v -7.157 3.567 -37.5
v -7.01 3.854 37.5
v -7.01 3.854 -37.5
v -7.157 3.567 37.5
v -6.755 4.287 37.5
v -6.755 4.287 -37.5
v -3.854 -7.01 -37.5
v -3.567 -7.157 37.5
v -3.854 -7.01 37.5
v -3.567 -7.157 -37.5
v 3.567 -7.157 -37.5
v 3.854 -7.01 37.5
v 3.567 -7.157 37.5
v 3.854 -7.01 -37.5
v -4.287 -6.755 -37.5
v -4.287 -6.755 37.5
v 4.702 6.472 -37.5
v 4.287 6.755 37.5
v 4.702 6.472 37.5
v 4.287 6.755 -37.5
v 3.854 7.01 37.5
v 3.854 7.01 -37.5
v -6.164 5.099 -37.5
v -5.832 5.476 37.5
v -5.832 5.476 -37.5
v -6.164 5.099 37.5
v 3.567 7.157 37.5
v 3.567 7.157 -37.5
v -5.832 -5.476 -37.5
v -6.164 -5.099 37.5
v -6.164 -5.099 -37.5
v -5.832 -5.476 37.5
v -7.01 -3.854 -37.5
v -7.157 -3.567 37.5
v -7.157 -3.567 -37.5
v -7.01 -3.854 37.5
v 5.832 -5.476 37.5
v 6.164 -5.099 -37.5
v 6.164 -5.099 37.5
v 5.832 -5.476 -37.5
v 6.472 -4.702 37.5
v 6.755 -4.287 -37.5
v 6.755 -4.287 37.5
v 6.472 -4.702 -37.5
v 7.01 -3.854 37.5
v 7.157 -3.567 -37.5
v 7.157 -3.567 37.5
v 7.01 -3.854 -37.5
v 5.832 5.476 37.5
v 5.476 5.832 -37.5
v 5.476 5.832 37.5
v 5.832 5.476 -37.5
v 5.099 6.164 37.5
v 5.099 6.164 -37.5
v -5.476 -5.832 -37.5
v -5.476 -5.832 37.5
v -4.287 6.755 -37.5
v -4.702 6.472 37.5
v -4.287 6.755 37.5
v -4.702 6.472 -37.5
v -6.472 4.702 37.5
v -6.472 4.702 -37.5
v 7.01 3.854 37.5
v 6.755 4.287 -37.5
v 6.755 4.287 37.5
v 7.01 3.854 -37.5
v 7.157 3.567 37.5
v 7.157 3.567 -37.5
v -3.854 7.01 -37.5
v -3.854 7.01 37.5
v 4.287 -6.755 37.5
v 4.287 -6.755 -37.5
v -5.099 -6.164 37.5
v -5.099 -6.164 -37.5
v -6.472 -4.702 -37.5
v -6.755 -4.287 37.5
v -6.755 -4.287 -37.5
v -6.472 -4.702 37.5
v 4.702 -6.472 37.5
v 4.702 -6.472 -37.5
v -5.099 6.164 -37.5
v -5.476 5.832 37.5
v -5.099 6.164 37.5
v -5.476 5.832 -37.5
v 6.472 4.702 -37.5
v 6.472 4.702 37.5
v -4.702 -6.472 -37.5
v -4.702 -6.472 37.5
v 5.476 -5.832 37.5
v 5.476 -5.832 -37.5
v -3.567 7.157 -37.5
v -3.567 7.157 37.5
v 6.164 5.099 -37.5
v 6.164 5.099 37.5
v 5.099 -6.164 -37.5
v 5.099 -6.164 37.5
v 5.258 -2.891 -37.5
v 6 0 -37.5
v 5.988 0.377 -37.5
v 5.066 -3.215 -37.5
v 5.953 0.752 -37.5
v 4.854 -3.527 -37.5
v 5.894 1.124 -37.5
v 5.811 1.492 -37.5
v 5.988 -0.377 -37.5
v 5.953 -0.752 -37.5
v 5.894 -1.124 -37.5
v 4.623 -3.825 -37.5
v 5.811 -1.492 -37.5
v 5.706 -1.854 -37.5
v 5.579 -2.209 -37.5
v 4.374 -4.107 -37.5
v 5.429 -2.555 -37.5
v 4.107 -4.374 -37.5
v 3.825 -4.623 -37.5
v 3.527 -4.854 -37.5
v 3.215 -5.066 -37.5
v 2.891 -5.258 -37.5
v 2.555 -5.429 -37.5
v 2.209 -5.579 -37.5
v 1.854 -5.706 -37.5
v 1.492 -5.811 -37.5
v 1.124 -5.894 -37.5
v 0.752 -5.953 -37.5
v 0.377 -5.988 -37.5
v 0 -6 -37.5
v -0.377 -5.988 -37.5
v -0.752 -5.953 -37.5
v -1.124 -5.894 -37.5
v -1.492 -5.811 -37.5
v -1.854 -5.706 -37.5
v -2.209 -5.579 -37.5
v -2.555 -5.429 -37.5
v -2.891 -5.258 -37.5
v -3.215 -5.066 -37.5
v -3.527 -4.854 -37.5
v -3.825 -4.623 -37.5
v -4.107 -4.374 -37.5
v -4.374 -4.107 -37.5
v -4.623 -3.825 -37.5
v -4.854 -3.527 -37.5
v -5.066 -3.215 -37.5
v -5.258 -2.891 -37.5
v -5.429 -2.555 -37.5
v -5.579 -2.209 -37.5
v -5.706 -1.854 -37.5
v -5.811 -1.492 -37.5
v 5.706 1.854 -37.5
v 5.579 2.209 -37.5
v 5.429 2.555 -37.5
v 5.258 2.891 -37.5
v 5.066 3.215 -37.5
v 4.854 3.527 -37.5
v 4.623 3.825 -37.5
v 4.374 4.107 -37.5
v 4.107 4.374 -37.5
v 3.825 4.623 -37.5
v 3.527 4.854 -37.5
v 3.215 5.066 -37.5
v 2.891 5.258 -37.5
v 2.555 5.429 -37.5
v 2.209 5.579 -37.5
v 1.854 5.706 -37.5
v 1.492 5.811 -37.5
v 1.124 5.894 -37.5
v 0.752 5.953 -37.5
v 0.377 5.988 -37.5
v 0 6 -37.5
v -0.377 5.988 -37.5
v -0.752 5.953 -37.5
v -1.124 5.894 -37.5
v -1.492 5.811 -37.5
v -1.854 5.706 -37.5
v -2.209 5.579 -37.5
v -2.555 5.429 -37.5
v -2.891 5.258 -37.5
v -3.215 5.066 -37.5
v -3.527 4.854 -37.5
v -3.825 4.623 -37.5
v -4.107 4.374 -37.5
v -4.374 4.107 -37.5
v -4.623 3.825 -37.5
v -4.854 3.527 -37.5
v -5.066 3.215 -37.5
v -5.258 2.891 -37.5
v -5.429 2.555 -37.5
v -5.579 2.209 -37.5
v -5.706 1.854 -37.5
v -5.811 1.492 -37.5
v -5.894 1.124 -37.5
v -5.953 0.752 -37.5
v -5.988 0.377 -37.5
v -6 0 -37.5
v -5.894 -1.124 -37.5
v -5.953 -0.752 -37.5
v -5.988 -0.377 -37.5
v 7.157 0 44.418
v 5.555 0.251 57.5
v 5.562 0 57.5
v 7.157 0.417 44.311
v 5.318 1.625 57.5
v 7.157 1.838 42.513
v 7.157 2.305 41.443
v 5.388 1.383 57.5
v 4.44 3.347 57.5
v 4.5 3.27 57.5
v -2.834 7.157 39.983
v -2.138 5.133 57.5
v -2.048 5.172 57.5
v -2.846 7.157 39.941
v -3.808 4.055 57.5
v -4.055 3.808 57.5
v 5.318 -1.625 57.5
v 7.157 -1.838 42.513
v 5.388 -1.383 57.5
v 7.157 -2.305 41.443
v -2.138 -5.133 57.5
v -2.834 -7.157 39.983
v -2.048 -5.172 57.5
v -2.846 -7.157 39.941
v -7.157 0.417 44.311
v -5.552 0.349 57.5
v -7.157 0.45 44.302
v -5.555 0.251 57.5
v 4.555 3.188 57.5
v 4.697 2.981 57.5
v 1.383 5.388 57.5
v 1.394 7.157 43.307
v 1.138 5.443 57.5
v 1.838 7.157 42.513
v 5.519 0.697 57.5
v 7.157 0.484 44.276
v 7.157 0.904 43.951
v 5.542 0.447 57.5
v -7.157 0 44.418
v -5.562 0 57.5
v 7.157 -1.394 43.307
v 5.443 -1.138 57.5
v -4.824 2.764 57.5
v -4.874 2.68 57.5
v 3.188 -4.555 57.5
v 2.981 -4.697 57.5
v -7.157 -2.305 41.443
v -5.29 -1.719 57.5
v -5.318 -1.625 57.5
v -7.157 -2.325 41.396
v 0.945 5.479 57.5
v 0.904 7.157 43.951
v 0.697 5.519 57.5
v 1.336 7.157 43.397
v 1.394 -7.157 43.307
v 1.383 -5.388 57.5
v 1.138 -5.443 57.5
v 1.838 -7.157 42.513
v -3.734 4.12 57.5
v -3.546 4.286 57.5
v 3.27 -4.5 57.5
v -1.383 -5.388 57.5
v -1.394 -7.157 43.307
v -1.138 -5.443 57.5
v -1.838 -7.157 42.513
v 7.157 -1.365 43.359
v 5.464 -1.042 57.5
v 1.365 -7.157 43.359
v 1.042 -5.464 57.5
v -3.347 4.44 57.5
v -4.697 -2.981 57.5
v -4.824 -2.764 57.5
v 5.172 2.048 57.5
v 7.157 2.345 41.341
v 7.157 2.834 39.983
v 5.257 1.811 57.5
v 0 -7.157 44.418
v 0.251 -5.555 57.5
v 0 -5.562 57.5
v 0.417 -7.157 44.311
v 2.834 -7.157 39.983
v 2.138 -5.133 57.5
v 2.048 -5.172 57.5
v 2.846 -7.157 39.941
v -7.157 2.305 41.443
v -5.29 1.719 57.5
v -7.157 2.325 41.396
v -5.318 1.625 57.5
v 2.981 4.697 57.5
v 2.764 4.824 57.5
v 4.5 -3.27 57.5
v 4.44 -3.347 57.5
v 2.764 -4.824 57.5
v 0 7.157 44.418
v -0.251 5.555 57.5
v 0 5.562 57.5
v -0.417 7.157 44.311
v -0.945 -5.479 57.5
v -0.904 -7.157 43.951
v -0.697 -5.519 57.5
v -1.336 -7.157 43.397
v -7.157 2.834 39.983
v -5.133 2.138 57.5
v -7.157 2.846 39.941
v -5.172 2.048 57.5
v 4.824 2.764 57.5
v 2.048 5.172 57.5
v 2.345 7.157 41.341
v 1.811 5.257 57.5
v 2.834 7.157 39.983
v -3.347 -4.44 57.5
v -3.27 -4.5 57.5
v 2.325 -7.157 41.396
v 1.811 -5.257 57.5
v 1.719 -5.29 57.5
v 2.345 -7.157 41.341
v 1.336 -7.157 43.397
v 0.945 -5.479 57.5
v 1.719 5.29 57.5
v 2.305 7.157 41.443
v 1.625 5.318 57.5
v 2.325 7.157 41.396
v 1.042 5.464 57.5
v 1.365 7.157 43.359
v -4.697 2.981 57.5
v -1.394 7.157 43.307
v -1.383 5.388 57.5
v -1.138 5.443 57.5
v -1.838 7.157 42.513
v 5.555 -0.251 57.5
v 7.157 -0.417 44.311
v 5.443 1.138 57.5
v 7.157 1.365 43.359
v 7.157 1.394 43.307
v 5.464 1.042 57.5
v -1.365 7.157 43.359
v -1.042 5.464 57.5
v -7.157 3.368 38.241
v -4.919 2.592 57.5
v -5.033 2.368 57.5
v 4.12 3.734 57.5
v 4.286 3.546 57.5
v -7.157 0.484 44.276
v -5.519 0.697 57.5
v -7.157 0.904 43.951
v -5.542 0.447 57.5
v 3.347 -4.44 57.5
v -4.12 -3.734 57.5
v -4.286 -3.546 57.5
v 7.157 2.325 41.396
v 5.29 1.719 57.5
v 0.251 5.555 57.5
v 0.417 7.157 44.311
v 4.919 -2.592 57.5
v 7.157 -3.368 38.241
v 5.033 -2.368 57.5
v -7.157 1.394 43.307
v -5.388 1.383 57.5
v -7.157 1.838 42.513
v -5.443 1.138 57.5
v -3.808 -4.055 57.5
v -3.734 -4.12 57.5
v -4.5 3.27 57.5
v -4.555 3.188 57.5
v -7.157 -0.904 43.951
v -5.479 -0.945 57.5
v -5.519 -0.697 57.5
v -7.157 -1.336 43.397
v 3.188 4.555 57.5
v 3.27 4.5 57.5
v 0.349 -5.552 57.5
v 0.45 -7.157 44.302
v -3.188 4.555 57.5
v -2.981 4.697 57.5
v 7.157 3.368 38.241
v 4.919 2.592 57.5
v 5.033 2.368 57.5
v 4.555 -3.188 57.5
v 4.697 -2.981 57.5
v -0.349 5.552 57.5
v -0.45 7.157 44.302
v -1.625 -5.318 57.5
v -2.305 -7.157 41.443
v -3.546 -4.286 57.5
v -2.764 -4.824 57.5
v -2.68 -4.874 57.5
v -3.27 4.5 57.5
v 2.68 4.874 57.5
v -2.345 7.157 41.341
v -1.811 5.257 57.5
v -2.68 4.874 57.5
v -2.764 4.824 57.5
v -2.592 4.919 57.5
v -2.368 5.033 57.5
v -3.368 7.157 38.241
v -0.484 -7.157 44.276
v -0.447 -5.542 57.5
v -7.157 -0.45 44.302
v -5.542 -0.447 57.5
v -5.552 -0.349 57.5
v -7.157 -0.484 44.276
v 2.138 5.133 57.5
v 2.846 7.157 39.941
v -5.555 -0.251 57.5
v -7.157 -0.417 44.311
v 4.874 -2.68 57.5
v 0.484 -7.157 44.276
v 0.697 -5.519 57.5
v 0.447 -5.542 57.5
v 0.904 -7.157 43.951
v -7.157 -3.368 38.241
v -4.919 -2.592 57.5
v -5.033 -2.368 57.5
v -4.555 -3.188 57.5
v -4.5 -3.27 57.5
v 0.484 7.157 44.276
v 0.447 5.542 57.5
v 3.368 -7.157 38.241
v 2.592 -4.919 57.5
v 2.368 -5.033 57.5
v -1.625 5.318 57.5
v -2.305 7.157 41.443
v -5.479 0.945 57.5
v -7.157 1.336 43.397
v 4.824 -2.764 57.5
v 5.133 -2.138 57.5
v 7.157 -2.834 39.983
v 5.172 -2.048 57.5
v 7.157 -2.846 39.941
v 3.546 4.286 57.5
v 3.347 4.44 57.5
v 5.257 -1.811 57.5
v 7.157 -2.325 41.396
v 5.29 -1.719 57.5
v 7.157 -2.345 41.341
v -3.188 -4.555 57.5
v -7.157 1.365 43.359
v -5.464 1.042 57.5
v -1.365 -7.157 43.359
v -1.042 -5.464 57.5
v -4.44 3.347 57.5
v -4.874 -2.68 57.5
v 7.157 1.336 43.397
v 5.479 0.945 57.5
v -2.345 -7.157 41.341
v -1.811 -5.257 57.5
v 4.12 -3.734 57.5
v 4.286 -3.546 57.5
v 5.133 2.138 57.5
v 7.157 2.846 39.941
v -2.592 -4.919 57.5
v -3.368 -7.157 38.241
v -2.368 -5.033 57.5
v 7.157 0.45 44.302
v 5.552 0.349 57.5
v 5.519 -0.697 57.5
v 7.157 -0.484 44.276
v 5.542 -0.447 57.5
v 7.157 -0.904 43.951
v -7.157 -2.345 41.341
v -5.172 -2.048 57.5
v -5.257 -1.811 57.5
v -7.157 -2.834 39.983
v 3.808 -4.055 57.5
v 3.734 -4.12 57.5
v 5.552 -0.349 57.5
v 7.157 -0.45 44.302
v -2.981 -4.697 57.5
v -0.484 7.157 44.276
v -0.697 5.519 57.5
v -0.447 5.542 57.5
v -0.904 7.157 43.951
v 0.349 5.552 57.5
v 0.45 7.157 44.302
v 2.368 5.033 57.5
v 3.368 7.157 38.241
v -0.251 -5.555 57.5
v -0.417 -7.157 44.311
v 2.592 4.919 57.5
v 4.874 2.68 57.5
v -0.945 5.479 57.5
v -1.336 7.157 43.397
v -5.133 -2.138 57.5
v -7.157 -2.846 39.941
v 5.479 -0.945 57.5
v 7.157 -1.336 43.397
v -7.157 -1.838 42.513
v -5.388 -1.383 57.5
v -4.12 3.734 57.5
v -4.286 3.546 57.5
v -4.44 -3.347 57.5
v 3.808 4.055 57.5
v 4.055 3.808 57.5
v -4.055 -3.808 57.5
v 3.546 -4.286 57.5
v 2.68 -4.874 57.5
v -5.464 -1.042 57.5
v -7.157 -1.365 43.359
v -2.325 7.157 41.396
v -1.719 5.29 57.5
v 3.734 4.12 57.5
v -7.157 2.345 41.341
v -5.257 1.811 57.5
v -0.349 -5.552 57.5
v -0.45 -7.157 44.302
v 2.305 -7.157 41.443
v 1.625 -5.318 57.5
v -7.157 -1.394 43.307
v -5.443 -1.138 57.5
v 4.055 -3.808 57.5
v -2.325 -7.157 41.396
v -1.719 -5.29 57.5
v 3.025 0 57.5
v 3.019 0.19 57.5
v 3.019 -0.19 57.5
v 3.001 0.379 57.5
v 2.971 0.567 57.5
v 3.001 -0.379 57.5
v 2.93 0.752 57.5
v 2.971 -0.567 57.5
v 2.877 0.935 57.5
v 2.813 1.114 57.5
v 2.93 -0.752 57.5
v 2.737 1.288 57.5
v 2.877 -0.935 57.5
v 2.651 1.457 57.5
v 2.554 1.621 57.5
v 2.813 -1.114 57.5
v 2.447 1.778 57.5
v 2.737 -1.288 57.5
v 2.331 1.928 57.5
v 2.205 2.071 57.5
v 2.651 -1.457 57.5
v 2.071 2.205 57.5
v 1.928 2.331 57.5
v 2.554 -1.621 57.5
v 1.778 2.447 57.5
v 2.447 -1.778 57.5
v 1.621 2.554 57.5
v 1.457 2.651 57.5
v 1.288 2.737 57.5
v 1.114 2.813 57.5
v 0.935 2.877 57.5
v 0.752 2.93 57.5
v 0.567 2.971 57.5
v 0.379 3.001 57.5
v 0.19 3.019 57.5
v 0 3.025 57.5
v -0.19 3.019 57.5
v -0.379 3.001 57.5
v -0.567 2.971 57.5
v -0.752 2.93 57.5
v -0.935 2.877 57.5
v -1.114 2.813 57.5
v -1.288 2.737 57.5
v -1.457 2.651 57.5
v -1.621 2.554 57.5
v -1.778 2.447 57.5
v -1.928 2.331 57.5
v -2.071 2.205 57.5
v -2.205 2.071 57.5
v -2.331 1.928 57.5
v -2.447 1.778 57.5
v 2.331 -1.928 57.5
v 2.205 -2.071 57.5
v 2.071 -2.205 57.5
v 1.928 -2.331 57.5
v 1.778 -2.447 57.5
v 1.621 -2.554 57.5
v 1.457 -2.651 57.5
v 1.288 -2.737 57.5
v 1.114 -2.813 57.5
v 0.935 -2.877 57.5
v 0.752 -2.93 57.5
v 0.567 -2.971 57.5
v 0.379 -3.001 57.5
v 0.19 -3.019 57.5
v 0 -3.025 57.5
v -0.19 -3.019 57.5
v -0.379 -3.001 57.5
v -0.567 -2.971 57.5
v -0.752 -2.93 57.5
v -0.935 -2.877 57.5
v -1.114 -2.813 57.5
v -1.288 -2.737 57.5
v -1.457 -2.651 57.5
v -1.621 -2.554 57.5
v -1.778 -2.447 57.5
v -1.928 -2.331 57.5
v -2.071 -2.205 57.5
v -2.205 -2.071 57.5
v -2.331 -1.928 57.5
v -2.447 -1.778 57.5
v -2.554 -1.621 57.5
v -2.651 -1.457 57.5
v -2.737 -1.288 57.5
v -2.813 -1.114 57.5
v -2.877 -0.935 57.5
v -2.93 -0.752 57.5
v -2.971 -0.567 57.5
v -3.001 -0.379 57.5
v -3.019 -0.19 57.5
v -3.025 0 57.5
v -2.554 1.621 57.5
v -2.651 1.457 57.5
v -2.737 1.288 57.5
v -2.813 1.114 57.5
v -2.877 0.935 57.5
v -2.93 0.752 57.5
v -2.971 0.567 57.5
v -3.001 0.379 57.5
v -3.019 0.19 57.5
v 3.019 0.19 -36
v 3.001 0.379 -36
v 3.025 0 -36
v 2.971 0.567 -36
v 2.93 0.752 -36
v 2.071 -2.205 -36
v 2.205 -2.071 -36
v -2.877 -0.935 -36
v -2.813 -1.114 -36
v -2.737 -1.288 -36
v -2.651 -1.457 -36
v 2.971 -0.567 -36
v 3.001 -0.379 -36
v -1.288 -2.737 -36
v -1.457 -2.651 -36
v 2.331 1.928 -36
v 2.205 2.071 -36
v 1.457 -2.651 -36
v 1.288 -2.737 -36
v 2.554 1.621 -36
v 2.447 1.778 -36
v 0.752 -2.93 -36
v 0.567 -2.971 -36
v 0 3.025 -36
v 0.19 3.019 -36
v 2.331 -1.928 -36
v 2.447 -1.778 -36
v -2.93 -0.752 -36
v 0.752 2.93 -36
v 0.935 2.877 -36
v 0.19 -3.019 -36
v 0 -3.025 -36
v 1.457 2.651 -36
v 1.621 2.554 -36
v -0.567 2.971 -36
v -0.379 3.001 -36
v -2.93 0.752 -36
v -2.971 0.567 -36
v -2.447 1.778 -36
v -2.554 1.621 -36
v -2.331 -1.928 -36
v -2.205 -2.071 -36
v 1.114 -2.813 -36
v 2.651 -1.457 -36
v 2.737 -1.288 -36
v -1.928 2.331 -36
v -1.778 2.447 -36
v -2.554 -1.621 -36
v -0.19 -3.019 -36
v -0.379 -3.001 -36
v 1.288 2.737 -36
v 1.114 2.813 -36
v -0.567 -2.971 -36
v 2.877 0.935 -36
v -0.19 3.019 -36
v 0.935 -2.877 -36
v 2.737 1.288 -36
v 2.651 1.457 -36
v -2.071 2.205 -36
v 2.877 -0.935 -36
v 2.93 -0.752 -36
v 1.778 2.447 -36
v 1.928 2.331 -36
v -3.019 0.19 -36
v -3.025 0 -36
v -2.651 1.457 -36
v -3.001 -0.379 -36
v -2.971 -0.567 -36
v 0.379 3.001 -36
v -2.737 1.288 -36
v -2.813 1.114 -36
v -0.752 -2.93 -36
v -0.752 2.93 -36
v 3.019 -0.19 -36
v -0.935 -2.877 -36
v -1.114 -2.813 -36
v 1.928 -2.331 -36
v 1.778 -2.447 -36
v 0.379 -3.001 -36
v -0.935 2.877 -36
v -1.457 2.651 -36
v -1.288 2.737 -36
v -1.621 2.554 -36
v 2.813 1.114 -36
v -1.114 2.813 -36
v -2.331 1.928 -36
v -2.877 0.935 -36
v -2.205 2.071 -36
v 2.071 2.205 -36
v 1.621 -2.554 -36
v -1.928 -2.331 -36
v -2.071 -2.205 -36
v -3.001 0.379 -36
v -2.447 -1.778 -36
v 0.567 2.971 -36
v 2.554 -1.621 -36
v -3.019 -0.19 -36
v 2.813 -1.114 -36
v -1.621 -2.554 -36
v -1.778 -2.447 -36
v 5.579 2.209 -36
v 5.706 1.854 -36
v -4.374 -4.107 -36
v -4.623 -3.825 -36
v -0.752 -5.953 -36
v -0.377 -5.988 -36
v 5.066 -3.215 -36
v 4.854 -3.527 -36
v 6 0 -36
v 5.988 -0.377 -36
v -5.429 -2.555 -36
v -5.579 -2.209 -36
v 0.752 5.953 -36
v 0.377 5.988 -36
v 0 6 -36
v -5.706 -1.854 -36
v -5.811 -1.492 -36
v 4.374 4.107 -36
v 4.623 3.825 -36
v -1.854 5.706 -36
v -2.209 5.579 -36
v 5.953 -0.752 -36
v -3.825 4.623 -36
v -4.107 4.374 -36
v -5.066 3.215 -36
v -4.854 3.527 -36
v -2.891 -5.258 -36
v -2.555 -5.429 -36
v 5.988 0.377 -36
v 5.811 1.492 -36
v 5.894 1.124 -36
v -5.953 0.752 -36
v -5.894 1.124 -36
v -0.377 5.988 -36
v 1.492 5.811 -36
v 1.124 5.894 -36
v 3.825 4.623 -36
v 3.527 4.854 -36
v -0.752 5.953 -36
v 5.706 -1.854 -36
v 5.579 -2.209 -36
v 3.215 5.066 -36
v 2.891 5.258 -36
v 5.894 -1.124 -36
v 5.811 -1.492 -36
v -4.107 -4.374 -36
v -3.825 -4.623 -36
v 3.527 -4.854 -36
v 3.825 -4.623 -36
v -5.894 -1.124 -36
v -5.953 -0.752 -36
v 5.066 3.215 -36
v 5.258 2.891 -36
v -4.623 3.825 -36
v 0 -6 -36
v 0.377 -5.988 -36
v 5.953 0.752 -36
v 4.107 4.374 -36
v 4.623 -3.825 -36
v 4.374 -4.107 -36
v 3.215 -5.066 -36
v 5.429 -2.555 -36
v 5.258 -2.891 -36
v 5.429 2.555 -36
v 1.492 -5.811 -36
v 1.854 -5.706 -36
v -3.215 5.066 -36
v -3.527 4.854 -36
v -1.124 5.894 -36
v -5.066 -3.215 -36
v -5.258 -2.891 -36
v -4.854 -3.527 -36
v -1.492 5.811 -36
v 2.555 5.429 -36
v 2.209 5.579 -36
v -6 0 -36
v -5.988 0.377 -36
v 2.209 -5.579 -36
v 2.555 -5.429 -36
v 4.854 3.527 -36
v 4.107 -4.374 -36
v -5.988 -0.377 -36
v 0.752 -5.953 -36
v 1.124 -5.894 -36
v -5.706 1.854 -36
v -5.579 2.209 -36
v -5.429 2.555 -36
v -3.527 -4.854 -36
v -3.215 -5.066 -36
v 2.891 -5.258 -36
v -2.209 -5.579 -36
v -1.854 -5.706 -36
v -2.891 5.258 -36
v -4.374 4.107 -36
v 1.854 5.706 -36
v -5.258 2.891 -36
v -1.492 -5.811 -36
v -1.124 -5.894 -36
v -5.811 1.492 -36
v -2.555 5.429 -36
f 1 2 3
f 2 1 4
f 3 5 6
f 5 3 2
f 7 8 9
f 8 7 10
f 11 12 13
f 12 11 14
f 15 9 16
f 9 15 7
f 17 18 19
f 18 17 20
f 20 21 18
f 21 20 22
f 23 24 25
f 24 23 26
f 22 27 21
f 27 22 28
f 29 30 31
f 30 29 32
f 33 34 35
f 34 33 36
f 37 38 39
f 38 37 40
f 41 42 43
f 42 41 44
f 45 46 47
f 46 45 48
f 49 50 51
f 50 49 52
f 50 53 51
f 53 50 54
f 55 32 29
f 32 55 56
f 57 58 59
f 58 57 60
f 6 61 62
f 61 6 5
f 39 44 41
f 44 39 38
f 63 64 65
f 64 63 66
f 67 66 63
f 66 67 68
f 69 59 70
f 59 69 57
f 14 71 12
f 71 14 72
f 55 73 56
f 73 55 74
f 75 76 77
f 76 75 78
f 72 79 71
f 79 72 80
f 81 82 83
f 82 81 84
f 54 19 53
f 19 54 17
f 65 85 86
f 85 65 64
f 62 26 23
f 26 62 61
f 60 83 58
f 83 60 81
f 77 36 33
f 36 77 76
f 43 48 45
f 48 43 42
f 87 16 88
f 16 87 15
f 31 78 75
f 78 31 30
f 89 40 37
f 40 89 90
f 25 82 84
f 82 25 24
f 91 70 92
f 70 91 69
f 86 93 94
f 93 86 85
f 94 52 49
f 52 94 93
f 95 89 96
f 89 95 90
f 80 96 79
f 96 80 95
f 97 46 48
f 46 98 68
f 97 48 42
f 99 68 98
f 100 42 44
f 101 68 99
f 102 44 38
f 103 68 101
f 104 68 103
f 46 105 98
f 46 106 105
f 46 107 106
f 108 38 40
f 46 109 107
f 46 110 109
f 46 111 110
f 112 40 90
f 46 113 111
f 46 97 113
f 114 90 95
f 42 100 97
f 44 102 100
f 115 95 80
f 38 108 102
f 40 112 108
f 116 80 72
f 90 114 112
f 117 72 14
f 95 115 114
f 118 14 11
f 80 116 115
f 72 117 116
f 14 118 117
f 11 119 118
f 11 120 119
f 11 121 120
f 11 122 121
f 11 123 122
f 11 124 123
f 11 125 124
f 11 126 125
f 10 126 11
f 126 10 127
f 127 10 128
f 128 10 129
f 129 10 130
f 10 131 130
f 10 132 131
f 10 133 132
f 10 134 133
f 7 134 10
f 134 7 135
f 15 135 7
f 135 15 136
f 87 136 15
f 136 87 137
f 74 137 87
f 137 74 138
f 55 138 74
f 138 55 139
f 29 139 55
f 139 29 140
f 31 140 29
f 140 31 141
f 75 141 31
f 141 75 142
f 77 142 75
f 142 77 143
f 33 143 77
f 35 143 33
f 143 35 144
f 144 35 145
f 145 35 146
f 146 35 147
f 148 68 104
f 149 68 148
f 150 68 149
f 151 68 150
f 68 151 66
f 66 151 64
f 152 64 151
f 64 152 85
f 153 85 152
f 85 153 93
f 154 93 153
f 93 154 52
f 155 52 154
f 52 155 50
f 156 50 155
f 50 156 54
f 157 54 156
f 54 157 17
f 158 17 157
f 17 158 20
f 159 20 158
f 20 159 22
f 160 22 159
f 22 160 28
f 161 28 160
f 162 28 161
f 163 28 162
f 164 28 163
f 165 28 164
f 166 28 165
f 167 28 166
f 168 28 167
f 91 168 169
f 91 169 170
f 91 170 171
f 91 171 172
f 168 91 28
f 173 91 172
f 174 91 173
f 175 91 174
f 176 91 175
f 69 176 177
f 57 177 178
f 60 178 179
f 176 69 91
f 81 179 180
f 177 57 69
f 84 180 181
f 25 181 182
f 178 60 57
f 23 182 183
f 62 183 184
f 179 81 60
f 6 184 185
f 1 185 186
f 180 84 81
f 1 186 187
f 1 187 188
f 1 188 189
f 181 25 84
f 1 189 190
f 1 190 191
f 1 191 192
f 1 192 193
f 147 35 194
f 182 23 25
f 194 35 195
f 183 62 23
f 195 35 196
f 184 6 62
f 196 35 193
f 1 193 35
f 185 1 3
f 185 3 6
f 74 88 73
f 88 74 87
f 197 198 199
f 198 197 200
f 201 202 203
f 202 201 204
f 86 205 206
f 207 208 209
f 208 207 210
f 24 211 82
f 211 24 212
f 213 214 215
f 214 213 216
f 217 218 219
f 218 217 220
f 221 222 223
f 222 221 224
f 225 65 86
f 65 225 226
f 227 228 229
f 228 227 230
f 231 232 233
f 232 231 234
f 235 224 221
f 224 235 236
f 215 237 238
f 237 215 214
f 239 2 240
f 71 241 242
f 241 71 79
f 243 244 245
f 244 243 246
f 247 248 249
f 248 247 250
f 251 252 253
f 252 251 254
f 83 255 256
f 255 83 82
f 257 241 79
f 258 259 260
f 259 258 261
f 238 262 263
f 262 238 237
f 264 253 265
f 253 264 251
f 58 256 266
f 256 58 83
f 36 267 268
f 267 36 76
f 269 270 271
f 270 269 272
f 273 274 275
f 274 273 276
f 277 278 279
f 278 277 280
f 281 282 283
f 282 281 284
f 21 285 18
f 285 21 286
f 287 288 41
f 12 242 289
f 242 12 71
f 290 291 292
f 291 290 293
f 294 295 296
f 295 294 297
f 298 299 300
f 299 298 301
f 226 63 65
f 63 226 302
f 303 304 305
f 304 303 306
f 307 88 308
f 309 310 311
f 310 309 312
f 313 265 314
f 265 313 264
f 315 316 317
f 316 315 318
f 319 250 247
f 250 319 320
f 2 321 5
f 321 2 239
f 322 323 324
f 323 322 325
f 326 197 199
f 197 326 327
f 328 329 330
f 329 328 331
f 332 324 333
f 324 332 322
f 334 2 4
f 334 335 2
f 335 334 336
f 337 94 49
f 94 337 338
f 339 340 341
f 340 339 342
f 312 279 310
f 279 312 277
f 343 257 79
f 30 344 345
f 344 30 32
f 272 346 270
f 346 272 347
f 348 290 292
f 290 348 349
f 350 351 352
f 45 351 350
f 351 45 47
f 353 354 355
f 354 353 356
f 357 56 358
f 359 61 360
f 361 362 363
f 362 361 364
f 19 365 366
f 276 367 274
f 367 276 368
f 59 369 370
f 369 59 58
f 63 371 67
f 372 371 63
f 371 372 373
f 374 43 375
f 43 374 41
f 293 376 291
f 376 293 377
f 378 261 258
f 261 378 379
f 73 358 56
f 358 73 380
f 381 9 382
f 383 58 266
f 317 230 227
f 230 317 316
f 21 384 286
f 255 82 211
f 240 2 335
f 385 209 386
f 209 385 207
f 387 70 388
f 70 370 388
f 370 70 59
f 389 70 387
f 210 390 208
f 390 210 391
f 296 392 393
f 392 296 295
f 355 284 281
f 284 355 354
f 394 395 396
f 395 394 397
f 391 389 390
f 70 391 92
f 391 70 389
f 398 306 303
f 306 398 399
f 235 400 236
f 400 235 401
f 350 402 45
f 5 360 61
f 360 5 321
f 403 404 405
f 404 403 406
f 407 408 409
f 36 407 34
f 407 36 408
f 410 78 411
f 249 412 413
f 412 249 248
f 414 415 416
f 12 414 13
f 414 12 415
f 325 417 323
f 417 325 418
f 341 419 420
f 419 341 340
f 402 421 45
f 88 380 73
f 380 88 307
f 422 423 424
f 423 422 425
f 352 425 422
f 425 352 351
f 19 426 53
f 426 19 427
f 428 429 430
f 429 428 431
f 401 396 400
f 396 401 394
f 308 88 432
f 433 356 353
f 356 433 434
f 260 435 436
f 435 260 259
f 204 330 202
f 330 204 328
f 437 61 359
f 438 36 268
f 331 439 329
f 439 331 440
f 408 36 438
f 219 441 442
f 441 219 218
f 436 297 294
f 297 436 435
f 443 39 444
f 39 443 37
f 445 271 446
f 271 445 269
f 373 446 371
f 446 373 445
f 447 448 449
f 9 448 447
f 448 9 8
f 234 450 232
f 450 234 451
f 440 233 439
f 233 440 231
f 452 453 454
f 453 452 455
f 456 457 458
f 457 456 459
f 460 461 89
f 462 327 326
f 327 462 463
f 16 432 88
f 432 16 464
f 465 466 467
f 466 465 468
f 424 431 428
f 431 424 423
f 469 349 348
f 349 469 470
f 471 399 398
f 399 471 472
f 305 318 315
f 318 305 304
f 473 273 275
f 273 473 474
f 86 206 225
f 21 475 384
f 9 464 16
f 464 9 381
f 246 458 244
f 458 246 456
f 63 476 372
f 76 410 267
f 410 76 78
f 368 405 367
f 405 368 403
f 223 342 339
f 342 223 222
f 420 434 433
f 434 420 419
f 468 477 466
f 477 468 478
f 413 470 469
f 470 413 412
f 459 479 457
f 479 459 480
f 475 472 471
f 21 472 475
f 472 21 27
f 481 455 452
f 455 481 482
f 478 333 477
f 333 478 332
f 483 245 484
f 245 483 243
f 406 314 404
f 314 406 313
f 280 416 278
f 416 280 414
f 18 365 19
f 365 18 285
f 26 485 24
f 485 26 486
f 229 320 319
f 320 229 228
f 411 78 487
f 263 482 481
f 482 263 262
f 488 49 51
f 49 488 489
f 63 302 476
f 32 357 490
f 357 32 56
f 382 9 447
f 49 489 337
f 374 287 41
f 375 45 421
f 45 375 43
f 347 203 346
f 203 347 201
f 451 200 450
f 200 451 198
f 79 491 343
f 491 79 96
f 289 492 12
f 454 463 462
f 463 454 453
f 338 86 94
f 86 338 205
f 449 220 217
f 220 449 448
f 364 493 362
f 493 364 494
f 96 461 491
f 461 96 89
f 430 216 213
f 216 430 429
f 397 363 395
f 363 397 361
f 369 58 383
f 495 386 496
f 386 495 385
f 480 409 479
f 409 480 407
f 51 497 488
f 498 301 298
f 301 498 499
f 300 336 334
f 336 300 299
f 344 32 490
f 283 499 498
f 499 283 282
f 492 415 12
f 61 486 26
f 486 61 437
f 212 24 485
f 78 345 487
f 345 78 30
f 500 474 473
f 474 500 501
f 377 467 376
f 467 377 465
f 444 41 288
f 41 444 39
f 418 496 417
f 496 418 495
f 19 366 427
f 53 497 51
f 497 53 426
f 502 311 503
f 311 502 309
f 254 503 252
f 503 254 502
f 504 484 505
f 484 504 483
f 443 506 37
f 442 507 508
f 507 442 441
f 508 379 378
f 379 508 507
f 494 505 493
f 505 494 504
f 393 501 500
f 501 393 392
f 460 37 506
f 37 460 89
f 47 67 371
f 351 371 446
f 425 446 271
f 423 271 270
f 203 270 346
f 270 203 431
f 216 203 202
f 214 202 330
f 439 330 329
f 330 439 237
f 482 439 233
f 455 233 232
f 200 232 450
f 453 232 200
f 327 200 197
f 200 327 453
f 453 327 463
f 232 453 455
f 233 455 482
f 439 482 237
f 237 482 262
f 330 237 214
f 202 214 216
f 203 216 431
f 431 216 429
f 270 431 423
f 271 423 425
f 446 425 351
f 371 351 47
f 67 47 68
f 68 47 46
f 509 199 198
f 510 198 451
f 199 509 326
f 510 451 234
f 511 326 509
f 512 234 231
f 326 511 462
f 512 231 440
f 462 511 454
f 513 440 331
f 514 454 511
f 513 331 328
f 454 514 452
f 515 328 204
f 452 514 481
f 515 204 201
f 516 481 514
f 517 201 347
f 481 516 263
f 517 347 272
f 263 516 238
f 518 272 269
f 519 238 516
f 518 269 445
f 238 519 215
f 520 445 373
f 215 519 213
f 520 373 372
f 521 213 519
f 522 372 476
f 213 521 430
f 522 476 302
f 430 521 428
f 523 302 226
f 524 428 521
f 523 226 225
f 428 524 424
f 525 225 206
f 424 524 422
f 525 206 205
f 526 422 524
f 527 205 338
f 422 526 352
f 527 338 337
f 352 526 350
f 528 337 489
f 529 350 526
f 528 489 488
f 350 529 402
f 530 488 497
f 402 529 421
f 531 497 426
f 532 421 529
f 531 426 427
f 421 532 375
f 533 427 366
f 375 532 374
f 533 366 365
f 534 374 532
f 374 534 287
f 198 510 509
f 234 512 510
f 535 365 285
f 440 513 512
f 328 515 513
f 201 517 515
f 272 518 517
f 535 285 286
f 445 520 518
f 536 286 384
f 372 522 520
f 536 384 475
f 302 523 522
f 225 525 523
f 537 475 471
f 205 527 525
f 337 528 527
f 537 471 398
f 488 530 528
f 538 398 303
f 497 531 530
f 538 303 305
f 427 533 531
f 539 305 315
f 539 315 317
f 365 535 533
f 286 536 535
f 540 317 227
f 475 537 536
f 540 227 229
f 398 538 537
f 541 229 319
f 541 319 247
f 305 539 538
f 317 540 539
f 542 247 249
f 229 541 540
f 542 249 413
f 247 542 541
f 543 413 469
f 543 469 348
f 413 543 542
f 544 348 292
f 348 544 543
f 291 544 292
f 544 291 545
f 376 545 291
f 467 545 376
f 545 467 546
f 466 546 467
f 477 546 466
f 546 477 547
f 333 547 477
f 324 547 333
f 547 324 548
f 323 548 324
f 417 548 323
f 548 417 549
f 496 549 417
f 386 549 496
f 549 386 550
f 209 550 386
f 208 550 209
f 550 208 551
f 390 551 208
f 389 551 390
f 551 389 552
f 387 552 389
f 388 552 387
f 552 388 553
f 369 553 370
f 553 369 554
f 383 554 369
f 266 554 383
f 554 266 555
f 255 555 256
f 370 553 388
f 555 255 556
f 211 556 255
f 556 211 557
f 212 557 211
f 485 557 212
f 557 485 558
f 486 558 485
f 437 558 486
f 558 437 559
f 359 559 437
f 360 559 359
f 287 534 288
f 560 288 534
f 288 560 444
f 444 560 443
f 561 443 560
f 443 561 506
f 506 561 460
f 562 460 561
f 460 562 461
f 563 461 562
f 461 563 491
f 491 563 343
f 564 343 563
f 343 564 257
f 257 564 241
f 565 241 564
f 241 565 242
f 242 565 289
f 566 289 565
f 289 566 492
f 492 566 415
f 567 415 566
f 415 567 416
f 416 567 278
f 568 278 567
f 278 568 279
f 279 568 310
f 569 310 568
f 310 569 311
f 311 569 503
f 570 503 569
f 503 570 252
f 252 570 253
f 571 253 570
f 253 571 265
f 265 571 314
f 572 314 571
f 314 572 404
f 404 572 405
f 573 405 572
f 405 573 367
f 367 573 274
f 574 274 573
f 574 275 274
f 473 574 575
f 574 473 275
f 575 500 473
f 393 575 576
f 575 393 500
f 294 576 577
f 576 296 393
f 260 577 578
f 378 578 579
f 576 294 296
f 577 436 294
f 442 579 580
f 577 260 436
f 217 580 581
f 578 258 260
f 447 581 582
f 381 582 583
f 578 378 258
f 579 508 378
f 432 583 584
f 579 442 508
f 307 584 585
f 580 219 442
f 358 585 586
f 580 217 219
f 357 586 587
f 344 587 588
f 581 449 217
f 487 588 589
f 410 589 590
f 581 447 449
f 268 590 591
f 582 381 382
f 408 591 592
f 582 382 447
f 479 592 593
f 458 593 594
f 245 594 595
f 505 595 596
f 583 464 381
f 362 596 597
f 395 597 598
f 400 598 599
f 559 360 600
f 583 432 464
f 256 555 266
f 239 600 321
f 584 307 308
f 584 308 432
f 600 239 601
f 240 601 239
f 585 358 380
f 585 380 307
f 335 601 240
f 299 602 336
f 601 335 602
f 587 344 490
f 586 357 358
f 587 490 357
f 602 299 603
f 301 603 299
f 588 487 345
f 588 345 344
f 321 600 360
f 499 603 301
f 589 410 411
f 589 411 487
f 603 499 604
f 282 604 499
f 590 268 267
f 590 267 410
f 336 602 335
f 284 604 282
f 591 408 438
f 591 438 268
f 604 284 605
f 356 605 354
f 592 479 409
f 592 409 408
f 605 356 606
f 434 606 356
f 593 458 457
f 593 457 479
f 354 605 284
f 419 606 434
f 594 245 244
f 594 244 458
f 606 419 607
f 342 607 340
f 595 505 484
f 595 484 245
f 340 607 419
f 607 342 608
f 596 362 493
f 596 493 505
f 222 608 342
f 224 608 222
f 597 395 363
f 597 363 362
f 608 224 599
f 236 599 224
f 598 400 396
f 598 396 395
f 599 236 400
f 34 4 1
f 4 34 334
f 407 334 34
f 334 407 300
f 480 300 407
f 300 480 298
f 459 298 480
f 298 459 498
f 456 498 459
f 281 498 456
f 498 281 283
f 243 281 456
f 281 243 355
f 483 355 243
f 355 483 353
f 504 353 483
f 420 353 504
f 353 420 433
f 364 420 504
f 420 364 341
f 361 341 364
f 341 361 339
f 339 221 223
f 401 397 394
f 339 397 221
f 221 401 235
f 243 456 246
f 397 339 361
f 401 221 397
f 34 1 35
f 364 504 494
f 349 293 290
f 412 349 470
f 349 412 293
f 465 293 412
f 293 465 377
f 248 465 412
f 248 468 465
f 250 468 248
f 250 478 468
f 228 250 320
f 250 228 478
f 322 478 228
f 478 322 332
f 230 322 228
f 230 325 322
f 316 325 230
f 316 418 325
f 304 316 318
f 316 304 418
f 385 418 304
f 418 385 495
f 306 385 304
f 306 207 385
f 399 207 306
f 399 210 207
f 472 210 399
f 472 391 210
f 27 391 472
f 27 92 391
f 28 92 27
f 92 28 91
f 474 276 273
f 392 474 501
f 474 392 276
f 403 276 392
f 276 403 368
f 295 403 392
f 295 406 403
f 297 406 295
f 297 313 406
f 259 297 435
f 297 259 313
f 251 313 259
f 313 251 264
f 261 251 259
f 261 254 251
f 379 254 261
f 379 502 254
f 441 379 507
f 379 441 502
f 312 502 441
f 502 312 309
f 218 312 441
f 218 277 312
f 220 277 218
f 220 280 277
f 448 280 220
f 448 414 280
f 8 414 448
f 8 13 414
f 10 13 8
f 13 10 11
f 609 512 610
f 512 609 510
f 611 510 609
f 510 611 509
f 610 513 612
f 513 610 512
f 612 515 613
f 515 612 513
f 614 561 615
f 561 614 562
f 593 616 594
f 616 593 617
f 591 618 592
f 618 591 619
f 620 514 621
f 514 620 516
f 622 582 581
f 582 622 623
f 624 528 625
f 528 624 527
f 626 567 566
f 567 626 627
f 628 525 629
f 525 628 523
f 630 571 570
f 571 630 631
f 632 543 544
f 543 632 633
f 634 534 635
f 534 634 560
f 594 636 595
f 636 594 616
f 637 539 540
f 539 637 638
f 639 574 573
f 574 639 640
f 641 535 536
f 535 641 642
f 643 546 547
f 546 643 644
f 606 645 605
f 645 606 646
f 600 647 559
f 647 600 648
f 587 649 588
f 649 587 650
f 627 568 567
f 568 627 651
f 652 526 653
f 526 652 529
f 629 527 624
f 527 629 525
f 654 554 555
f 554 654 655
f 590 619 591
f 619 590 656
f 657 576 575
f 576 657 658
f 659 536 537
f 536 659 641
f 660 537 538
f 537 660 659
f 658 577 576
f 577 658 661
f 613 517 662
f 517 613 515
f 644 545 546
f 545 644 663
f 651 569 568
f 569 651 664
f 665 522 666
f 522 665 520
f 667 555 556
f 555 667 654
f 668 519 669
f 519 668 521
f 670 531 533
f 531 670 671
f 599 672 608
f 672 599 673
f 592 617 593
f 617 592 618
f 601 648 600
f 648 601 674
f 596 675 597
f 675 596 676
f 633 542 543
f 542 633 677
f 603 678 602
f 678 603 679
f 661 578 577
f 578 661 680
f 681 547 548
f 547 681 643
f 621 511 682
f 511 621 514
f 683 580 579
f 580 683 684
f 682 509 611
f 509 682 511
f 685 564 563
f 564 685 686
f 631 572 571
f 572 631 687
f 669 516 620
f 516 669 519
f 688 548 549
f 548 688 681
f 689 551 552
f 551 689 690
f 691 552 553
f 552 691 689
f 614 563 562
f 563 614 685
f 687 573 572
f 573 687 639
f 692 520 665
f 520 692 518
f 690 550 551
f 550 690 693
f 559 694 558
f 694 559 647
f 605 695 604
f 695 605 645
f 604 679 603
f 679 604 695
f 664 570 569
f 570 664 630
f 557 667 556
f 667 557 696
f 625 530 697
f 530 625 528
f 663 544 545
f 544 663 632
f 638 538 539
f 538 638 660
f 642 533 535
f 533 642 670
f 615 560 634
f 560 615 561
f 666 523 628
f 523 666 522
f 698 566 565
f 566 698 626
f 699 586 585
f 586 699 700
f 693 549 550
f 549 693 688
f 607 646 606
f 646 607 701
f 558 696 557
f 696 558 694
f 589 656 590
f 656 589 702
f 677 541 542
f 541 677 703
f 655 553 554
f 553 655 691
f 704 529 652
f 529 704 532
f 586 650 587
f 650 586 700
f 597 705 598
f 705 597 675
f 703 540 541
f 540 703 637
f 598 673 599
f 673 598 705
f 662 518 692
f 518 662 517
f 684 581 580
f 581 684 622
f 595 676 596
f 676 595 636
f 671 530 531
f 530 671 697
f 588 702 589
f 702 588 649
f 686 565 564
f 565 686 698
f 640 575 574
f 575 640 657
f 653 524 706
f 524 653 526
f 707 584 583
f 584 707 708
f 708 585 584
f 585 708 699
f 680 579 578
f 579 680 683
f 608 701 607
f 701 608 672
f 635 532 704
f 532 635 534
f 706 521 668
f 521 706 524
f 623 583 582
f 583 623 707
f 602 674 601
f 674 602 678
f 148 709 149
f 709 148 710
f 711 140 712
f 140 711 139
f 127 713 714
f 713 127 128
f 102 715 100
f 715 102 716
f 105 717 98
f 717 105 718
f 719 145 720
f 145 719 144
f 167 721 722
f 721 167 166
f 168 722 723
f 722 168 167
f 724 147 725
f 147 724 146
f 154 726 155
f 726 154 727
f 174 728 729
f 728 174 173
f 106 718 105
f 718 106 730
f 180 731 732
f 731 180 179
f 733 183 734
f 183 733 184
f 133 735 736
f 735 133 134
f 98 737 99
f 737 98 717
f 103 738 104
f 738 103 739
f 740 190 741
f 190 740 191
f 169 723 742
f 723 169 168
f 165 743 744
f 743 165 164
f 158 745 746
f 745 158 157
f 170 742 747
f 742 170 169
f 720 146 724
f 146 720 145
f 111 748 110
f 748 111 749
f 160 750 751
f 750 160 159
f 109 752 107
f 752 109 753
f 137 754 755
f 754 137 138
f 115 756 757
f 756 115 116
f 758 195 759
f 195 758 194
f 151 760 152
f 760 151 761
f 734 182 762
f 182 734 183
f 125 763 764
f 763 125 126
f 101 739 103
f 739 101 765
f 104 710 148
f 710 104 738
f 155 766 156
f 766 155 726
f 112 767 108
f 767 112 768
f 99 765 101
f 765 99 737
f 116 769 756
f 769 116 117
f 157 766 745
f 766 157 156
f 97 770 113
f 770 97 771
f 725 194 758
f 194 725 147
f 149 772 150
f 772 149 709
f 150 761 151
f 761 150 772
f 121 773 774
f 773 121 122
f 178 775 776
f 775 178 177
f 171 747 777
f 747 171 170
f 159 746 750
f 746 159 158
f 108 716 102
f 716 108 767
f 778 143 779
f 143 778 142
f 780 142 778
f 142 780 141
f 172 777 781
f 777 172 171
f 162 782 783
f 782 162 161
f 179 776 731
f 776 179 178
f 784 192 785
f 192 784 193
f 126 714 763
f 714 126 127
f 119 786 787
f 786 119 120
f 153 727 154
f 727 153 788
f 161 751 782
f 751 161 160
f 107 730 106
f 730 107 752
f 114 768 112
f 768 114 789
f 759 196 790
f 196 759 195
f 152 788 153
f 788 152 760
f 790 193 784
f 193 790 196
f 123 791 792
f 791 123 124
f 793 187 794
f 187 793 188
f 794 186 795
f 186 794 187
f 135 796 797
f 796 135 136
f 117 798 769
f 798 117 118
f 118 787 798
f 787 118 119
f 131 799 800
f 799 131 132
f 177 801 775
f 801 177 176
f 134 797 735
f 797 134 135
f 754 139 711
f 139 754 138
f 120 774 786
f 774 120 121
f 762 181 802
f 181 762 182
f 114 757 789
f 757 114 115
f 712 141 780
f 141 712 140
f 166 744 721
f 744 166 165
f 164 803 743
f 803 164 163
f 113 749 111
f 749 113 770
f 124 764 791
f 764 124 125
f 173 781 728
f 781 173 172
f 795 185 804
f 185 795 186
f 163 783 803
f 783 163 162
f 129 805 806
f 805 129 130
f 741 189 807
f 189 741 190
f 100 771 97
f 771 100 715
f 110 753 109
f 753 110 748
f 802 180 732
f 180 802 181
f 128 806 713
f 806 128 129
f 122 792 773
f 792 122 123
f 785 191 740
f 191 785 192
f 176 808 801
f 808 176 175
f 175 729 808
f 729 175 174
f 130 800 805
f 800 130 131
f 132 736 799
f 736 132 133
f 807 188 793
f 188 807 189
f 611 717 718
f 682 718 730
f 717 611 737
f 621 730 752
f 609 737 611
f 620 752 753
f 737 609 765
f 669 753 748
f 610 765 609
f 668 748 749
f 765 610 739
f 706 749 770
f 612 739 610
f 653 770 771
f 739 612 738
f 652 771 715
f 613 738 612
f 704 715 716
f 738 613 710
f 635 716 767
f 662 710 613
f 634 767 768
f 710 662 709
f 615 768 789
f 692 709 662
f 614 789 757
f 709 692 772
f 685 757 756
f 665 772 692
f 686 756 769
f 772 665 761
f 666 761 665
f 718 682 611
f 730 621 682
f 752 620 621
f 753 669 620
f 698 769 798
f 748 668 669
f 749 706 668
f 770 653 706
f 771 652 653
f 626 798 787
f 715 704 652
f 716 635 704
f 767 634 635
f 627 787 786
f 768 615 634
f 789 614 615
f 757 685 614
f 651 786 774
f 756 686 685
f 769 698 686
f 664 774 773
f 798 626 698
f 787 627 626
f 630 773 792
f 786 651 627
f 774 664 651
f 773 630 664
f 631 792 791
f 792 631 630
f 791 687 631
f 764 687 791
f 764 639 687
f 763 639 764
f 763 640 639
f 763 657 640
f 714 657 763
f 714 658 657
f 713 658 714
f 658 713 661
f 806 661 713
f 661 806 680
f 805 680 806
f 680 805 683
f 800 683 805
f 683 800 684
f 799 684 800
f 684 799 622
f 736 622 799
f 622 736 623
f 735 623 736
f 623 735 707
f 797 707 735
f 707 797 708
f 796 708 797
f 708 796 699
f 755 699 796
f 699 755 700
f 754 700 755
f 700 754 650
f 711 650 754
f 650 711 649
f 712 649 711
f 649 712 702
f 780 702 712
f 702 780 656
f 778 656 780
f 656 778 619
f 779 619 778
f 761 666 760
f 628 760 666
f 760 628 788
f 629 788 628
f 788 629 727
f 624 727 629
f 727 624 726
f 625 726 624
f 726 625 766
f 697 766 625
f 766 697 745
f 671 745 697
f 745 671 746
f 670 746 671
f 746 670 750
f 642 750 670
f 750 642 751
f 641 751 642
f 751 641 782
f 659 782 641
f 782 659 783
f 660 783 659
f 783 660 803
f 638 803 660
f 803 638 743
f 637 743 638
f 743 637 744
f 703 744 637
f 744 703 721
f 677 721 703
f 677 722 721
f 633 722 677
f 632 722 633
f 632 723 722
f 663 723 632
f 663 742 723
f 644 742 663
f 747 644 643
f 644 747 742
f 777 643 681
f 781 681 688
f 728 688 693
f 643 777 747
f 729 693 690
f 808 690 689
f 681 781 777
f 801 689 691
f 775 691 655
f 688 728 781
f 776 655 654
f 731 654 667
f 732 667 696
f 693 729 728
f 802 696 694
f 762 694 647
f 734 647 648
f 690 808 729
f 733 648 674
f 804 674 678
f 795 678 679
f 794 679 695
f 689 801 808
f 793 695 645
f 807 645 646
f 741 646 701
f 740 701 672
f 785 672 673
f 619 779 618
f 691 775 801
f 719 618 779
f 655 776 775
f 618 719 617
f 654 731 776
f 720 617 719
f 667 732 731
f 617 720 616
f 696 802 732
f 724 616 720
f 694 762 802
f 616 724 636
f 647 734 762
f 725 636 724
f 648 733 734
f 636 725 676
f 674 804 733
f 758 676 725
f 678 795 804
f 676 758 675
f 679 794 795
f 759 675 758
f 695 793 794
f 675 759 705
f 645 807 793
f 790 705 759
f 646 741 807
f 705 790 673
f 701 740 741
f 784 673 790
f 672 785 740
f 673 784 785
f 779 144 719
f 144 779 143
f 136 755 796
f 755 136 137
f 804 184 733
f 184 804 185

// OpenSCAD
// This 12 gauge primer punch. Insert a 40d nail and round off its end.
//
// Warning -- some sanding and fitting may be required.
//
// This is licensed under the creative commons+attribution license
//
// To fulfil the attribution requirement, please link to:
// http://www.thingiverse.com/thing:2208570

/* [Main] */

// Define number of facets (large numbers provide better smoothing)
$fn=100;

// Define height of upper body in mm
body_height=75.0;

// Define height of lower cone in mm
cone_height=40.0;

// Define outside diameter of upper body in mm
body_diameter=16.0;

// Define outside diameter of lower cone end in mm
end_diameter=6.25;

// Define inside diameter of hole in mm
inside_diameter=6.05;

// Countersink depth in mm
depth=1.5;

// Counsersink diameter in mm
head_diameter=12.0;

difference()
{
	intersection()
	{
		#translate([0,0,0]) cube([body_diameter/sqrt(2)+3,body_diameter/sqrt(2)+3,body_height+cone_height],center=true);
		union() // Draw outer shape
		{
			translate([0,0,0])                           cylinder(h=body_height,r=body_diameter/2,center=true);
			translate([0,0,(body_height+cone_height)/2]) cylinder(h=cone_height,r1=body_diameter/2,r2=end_diameter/2,center=true);
		}
	}
	// Drill hole
	translate([0,0,cone_height/2])  cylinder(h=body_height+cone_height+2,r=inside_diameter/2,center=true);
	// Counter sink part of nail head
	translate([0,0,-(body_height-depth)/2]) cylinder(h=depth,r=head_diameter/2,center=true);
}
